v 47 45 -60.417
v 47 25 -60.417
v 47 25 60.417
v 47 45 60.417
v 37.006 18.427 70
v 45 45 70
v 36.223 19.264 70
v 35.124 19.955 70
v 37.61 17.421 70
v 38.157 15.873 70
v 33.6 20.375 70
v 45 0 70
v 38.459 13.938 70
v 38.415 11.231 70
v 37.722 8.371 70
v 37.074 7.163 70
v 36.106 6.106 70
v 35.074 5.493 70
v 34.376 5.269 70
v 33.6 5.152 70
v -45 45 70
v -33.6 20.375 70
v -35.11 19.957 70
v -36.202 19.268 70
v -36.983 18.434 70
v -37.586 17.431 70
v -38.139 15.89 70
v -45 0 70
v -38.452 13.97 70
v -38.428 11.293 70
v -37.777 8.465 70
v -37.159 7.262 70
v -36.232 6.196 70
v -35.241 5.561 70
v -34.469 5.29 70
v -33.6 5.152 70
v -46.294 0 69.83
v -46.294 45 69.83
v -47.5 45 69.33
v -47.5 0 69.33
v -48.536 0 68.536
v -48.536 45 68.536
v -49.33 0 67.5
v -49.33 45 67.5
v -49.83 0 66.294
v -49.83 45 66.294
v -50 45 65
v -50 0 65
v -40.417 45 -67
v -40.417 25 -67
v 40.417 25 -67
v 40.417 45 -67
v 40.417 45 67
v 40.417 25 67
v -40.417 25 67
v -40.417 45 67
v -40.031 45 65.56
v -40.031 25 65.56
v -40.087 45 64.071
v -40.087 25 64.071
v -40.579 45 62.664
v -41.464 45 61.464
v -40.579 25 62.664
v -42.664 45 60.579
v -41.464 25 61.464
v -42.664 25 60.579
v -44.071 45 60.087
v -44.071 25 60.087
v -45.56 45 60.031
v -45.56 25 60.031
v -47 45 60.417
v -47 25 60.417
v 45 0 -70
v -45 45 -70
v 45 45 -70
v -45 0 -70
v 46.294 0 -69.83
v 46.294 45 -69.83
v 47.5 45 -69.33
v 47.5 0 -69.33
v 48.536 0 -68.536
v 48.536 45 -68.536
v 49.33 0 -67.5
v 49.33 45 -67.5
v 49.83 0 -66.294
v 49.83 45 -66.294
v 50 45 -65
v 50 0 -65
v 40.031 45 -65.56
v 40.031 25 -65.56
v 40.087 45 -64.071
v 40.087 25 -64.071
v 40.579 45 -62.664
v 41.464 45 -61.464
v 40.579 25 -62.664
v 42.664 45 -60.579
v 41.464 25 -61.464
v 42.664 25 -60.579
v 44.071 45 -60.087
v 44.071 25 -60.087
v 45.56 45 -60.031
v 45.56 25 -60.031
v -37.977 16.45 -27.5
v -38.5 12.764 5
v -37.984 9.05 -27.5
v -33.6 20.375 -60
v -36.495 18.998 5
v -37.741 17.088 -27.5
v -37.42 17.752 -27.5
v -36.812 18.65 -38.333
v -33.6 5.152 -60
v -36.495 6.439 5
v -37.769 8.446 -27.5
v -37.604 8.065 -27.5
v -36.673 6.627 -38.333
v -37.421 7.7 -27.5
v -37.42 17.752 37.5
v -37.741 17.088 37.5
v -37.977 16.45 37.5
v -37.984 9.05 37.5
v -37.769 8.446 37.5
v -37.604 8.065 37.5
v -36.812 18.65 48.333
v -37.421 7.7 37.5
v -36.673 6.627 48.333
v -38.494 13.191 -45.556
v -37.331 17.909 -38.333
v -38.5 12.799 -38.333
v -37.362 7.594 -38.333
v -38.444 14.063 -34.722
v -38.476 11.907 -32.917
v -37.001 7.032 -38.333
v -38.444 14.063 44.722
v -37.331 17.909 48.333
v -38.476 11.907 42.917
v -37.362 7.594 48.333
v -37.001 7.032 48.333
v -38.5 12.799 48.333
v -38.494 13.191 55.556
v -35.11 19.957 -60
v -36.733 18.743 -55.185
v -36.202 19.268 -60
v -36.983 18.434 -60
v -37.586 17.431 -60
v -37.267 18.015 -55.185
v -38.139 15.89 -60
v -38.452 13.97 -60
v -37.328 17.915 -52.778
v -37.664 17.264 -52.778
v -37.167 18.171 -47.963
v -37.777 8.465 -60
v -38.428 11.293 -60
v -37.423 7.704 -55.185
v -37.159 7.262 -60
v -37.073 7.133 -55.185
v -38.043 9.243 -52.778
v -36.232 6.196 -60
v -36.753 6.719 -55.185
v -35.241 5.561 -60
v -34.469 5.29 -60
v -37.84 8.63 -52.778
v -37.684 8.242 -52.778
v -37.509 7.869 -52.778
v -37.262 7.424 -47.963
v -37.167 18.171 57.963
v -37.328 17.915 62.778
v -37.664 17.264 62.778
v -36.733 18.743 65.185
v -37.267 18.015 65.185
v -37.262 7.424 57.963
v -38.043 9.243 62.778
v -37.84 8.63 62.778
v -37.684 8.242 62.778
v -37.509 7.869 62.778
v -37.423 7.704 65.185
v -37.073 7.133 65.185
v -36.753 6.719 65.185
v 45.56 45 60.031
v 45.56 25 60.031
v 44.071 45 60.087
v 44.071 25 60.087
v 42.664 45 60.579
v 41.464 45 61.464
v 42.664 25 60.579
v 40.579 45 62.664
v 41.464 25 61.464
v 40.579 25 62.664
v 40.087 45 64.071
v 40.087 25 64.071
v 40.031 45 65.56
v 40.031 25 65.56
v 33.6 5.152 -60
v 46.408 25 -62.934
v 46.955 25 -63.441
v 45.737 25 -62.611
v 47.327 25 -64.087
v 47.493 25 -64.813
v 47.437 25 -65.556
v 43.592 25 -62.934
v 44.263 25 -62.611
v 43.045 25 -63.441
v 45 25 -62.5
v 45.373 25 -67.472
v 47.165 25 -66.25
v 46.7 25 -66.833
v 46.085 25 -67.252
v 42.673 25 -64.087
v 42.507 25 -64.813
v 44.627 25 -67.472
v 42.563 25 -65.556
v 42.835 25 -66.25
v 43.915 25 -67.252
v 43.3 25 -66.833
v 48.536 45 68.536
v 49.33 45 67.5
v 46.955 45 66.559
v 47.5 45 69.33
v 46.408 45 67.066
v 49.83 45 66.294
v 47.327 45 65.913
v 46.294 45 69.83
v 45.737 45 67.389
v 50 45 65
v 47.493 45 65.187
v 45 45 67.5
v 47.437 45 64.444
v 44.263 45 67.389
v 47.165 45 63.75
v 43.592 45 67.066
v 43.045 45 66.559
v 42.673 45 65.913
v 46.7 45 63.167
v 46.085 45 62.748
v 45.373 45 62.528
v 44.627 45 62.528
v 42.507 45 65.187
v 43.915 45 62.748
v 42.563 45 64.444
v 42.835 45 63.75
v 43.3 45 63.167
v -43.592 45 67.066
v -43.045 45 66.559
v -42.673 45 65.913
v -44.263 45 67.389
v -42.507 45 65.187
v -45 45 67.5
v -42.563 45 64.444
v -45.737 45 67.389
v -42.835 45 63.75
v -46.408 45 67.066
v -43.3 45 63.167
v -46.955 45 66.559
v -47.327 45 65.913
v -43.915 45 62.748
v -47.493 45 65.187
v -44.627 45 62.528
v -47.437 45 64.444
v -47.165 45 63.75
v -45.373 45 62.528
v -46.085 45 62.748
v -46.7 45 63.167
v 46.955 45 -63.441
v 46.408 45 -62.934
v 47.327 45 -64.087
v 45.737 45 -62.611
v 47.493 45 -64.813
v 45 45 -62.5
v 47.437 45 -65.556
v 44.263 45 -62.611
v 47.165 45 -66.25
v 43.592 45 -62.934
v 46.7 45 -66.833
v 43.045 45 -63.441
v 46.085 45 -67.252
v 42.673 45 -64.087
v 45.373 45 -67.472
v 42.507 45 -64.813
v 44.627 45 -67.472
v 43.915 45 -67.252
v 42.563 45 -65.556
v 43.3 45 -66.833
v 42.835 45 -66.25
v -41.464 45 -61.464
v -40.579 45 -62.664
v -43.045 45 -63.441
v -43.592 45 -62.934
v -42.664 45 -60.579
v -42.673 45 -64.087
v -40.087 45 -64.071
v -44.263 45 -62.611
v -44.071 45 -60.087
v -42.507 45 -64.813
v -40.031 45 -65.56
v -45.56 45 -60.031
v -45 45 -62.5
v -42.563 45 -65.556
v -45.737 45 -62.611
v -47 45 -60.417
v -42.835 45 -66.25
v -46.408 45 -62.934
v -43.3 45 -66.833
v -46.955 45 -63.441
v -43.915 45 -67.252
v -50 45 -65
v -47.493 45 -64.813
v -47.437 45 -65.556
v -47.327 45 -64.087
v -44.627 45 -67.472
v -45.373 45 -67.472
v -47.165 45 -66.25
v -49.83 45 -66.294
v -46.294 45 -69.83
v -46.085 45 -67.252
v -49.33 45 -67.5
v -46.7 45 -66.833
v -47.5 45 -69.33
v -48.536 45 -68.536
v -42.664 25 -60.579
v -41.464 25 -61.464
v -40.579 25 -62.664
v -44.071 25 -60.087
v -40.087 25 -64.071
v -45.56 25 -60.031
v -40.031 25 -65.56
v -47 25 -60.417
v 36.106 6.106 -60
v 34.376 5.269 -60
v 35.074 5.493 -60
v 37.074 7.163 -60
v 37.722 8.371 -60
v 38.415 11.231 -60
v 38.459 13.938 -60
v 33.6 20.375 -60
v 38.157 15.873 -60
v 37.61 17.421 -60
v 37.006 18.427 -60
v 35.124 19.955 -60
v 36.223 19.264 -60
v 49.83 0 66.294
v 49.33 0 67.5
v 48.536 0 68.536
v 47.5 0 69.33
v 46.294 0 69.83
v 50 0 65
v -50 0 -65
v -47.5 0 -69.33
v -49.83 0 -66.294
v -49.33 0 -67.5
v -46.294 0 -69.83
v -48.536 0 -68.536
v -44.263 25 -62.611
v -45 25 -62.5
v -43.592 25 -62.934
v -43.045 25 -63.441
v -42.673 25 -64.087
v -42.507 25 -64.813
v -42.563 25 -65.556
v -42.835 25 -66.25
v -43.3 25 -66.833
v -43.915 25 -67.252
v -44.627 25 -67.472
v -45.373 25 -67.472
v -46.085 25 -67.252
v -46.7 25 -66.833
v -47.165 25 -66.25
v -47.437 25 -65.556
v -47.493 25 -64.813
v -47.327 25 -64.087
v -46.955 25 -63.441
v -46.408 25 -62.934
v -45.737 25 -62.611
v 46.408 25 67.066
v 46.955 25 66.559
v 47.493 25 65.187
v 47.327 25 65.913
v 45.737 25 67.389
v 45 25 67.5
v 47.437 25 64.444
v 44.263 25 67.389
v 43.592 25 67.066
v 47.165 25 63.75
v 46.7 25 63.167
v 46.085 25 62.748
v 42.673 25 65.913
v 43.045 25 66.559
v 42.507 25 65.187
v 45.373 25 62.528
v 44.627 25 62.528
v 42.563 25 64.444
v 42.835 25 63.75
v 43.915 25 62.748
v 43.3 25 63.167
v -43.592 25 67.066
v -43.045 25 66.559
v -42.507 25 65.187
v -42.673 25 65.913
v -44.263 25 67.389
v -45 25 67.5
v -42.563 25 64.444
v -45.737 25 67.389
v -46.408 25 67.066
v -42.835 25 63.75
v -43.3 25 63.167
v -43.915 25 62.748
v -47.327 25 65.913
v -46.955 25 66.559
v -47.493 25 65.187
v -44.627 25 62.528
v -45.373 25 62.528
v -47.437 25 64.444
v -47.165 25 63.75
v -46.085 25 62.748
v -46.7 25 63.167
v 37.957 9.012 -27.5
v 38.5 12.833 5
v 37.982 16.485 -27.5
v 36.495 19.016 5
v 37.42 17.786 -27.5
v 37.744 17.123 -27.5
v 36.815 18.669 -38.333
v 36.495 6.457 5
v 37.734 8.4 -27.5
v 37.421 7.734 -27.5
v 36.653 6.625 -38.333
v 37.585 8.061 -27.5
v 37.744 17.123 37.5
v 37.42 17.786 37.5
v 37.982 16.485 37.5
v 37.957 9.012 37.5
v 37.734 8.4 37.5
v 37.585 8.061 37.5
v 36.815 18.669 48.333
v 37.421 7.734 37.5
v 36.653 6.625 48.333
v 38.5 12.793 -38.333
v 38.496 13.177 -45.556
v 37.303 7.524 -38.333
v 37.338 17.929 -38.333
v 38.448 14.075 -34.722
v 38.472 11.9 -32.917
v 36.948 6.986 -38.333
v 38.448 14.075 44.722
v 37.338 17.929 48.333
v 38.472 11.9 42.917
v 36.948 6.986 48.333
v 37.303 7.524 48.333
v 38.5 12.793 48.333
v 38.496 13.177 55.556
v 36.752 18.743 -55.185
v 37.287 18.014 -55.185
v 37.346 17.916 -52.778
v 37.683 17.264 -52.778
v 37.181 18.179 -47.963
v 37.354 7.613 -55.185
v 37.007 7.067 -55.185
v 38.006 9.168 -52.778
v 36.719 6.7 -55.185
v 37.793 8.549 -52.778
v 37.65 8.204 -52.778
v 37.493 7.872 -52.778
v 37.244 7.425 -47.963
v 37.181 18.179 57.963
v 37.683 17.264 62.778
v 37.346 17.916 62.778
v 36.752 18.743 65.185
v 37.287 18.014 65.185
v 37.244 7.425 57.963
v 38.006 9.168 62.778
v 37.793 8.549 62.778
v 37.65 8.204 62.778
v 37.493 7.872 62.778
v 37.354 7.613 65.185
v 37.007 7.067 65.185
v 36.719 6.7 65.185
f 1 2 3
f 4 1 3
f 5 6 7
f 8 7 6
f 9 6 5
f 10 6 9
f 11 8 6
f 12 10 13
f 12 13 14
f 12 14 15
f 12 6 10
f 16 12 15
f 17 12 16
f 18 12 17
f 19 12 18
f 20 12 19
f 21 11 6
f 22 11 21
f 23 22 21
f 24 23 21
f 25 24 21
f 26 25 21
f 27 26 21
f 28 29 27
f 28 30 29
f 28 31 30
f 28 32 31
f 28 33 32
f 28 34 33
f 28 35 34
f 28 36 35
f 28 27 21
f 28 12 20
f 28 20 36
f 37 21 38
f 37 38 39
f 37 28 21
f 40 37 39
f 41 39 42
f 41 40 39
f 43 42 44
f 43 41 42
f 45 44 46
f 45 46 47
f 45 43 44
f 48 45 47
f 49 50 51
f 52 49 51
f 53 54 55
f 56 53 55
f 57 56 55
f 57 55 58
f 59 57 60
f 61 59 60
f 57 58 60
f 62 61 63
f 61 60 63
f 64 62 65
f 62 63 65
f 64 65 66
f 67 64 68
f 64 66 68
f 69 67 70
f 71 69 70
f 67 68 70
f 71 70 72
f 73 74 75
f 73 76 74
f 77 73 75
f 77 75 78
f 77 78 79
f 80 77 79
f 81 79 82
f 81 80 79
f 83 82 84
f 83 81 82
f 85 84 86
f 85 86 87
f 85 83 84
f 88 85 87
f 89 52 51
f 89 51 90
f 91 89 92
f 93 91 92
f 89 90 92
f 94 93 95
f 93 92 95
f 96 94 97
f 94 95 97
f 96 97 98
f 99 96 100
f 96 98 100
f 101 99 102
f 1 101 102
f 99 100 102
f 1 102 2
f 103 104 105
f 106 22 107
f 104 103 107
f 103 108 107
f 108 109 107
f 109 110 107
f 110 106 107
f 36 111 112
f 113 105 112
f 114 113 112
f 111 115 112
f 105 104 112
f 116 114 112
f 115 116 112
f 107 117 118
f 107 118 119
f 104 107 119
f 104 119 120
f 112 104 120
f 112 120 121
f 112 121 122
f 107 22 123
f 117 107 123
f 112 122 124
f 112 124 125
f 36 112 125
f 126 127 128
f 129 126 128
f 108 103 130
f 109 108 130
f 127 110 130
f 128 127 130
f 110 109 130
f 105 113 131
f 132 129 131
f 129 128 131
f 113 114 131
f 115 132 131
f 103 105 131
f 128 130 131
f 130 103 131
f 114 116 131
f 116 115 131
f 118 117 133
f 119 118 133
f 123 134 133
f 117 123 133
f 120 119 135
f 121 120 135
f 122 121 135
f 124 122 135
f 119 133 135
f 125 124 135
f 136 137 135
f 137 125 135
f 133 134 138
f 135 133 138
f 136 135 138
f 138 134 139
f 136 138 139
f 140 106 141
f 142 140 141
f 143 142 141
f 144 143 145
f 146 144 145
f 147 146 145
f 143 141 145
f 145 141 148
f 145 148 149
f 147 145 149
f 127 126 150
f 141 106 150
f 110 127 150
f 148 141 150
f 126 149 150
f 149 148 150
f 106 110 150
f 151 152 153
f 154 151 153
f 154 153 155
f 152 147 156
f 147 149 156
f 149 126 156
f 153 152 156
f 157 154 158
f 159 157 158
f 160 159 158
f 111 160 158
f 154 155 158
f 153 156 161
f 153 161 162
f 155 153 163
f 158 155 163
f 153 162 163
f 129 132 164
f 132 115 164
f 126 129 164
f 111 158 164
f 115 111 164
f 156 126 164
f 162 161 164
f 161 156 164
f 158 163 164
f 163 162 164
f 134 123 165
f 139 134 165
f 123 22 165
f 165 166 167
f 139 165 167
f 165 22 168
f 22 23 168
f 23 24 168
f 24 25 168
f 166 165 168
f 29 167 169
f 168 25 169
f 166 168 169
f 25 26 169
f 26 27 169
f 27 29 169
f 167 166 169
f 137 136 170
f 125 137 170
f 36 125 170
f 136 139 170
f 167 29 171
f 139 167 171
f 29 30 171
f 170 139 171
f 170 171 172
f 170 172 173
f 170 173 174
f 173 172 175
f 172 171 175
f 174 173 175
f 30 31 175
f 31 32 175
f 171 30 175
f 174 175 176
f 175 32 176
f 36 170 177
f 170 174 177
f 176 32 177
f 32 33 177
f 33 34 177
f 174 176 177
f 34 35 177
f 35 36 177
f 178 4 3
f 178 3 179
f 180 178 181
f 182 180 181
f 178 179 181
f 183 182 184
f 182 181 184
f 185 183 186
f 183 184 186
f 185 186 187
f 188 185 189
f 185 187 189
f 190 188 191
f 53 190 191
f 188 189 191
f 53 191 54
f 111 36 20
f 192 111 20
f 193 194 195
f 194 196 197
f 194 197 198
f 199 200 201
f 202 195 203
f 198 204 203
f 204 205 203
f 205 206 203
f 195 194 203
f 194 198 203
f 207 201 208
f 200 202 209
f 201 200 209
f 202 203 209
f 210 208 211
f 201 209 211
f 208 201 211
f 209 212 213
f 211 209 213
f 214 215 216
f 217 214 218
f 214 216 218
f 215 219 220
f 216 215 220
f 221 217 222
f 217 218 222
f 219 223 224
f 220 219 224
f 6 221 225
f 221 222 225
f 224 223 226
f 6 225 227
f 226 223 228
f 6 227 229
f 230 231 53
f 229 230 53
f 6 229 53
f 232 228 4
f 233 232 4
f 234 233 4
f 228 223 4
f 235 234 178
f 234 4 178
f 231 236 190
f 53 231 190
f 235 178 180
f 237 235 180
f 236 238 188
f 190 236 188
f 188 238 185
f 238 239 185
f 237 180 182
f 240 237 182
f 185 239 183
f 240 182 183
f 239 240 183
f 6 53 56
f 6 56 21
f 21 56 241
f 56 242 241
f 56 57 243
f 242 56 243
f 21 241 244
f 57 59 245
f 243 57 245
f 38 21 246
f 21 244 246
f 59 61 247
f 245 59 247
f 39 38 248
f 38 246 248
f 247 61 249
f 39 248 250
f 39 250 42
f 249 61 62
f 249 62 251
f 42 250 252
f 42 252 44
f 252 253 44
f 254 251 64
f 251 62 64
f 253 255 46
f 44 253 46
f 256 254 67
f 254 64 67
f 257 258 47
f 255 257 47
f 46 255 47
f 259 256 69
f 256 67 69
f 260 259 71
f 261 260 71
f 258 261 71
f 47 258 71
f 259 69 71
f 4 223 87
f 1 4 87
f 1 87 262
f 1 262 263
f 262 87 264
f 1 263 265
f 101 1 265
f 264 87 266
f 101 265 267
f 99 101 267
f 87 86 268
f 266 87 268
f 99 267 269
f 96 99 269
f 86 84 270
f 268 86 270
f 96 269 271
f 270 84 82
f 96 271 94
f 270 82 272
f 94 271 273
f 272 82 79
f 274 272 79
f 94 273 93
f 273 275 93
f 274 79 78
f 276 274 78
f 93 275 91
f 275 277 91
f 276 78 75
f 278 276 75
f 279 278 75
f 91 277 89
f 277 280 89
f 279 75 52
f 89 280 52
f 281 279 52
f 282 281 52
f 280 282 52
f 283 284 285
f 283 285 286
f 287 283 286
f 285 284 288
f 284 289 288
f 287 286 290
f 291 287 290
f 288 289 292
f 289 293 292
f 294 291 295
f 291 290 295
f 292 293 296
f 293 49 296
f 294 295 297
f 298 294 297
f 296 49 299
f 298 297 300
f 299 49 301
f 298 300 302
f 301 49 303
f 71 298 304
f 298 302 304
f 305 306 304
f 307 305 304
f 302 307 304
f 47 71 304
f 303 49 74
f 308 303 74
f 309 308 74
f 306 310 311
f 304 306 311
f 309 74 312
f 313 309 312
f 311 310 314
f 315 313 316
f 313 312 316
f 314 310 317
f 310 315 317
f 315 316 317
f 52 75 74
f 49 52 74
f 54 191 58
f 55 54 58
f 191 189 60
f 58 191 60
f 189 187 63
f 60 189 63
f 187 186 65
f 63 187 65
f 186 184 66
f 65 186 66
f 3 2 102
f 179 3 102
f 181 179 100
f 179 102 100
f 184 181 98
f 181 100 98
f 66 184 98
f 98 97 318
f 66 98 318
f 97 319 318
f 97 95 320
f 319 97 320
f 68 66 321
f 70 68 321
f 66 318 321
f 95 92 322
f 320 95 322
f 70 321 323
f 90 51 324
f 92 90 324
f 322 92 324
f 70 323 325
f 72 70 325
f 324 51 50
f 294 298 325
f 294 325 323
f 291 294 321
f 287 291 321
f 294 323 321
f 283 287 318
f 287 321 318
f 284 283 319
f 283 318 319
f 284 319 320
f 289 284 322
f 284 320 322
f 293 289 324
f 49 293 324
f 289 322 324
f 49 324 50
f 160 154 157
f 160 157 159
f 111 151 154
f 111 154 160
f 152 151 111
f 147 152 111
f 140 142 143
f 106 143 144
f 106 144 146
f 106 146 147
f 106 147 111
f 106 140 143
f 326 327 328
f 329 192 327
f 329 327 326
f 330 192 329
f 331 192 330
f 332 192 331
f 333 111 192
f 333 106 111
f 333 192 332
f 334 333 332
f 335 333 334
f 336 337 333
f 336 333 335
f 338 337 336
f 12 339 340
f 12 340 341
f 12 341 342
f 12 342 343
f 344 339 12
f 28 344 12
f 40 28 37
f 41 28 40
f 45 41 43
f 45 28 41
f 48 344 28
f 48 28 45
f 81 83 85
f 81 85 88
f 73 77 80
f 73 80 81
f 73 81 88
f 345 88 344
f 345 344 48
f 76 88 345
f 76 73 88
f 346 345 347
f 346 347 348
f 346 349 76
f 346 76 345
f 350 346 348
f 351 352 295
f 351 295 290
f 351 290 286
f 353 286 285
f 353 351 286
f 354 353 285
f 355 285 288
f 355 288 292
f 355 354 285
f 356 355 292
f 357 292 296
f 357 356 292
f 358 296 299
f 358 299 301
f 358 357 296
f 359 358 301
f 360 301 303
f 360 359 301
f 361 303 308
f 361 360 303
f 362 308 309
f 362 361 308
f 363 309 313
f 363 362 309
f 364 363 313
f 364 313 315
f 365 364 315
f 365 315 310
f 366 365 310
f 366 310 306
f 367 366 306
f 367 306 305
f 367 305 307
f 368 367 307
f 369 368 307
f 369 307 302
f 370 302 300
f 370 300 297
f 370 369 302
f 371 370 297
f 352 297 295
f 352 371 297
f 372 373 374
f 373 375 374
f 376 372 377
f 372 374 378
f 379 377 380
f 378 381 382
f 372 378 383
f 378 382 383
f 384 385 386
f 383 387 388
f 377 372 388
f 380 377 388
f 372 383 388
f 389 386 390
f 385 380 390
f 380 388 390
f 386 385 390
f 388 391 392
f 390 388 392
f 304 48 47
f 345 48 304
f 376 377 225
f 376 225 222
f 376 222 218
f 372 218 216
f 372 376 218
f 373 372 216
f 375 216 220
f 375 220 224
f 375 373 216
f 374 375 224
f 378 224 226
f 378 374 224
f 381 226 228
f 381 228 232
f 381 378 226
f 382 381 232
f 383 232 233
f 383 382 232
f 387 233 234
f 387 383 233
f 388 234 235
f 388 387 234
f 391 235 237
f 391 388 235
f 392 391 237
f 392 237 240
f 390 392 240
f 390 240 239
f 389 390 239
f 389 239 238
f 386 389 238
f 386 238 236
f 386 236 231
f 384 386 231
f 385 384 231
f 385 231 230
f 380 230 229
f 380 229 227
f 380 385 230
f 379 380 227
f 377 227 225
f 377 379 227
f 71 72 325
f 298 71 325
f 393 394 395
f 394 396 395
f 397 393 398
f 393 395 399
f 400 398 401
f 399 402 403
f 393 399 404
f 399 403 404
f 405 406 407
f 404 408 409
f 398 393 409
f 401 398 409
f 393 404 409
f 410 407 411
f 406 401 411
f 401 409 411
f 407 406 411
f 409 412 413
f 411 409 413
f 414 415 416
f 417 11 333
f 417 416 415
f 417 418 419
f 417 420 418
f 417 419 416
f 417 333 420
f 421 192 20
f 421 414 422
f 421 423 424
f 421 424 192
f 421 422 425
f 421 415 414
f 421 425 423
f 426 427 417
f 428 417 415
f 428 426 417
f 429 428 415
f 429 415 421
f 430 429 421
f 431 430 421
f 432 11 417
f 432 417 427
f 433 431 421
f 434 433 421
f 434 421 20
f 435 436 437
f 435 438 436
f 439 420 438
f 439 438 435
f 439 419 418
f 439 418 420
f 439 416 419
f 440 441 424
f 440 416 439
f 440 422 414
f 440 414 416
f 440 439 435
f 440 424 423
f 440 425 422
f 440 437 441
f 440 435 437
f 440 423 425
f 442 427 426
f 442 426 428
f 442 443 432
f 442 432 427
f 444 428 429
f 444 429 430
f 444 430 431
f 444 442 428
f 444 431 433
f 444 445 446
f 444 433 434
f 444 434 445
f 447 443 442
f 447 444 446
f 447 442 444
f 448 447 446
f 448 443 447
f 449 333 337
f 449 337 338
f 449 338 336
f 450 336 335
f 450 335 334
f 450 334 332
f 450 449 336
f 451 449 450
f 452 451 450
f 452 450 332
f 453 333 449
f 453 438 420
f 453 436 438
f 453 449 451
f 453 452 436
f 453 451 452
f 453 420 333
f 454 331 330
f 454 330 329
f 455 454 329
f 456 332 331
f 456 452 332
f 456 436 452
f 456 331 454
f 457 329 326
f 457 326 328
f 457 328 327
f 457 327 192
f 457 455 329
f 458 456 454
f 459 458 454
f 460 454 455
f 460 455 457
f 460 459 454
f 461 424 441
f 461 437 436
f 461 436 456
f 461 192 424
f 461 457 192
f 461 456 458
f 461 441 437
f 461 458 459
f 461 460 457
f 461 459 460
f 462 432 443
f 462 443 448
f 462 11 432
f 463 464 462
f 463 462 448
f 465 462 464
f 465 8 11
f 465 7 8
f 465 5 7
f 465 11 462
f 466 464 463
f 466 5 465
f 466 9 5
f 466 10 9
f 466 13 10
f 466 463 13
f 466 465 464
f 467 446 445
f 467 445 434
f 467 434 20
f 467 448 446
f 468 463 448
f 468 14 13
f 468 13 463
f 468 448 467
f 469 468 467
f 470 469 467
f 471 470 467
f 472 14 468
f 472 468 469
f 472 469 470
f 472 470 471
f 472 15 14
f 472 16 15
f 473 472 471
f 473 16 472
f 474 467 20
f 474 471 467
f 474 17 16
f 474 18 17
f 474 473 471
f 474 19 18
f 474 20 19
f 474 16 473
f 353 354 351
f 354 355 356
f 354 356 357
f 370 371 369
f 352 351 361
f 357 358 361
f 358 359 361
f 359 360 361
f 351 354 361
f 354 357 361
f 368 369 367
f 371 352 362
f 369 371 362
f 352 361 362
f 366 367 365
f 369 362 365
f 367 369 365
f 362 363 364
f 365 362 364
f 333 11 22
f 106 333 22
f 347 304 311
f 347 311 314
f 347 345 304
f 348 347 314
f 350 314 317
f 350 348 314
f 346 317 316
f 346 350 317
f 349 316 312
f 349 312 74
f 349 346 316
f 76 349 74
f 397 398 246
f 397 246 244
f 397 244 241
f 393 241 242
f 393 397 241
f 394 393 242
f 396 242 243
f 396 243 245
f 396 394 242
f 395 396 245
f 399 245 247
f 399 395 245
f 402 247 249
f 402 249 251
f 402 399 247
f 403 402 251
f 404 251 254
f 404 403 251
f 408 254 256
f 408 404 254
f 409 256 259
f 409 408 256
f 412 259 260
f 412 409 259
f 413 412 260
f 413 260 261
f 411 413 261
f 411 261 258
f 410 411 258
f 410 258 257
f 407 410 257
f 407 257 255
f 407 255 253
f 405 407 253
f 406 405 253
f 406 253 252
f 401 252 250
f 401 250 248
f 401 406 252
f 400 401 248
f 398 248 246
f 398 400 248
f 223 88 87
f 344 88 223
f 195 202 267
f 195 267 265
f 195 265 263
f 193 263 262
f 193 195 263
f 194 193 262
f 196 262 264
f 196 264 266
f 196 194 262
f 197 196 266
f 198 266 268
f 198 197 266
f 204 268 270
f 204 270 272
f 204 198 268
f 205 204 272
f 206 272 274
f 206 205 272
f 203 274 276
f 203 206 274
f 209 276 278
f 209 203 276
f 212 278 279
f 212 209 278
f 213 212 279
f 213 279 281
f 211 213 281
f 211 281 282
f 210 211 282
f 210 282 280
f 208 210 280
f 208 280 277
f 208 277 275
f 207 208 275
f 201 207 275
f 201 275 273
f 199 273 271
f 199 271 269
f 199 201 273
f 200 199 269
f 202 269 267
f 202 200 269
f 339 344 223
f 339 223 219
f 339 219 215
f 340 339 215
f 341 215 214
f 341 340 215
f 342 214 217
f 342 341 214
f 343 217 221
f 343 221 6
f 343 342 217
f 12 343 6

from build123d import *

# Parameters (mm, degrees)
BOSS_EXTRUDE2_DEPTH = 25
BOSS_EXTRUDE3_START = 25
SKETCH1_3_R         = 2.5
BOSS_EXTRUDE3_DEPTH = 20
CUT_EXTRUDE1_DEPTH  = 130


with BuildPart() as part:
    # Sketch1 → Boss-Extrude2 (new body)
    with BuildSketch(Plane(origin=(0, 0, 0), x_dir=(1, 0, 0), z_dir=(0, 1, 0))):
        with BuildLine():
            Line((-45, 70), (45, 70))
            ThreePointArc((45, 70), (48.535533906, 68.535533906), (50, 65))
            Line((50, 65), (50, -65))
            ThreePointArc((50, -65), (48.535533906, -68.535533906), (45, -70))
            Line((45, -70), (-45, -70))
            ThreePointArc((-45, -70), (-48.535533906, -68.535533906), (-50, -65))
            Line((-50, -65), (-50, 65))
            ThreePointArc((-50, 65), (-48.535533906, 68.535533906), (-45, 70))
        make_face()
    extrude(amount=BOSS_EXTRUDE2_DEPTH)

    # Sketch1<3> → Boss-Extrude3 (add)
    with BuildSketch(Plane(origin=(0, 0, 0), x_dir=(1, 0, 0), z_dir=(0, 1, 0)).offset(BOSS_EXTRUDE3_START)):
        with BuildLine():
            Line((-45, 70), (45, 70))
            ThreePointArc((45, 70), (48.535533906, 68.535533906), (50, 65))
            Line((50, 65), (50, -65))
            ThreePointArc((50, -65), (48.535533906, -68.535533906), (45, -70))
            Line((45, -70), (-45, -70))
            ThreePointArc((-45, -70), (-48.535533906, -68.535533906), (-50, -65))
            Line((-50, -65), (-50, 65))
            ThreePointArc((-50, 65), (-48.535533906, 68.535533906), (-45, 70))
        make_face()
        with Locations(Location((-45, 65, 0), (0, 0, 270))):
            Circle(SKETCH1_3_R, mode=Mode.SUBTRACT)
        with Locations(Location((45, 65, 0), (0, 0, 270))):
            Circle(SKETCH1_3_R, mode=Mode.SUBTRACT)
        with Locations(Location((45, -65, 0), (0, 0, 270))):
            Circle(SKETCH1_3_R, mode=Mode.SUBTRACT)
        with Locations(Location((-45, -65, 0), (0, 0, 270))):
            Circle(SKETCH1_3_R, mode=Mode.SUBTRACT)
        with BuildLine():
            Line((-40.417424305, 67), (40.417424305, 67))
            ThreePointArc((40.417424305, 67), (41.464466094, 61.464466094), (47, 60.417424305))
            Line((47, 60.417424305), (47, -60.417424305))
            ThreePointArc((47, -60.417424305), (41.464466094, -61.464466094), (40.417424305, -67))
            Line((40.417424305, -67), (-40.417424305, -67))
            ThreePointArc((-40.417424305, -67), (-41.464466094, -61.464466094), (-47, -60.417424305))
            Line((-47, -60.417424305), (-47, 60.417424305))
            ThreePointArc((-47, 60.417424305), (-41.464466094, 61.464466094), (-40.417424305, 67))
        make_face(mode=Mode.SUBTRACT)
    extrude(amount=BOSS_EXTRUDE3_DEPTH)

    # Sketch2 → Cut-Extrude1 (cut)
    with BuildSketch(Plane.XY.offset(70)):
        with BuildLine():
            Line((-33.600286554, 5.152304199), (33.600286554, 5.152304199))
            add(Edge.make_bspline(
                [(33.600286554, 20.375134216), (37.254581283, 19.906525536), (39.744987875, 13.002442779), (37.255381919, 5.419067927), (33.600286554, 5.152304199)],
                knots=[0, 0, 0, 0, 0.5, 1, 1, 1, 1], degree=3))
            Line((33.600286554, 20.375134216), (-33.600286554, 20.375134216))
            add(Edge.make_bspline(
                [(-33.600286554, 20.375134216), (-37.254581283, 19.906525536), (-39.744987875, 12.865320549), (-37.255381919, 5.419067927), (-33.600286554, 5.152304199)],
                knots=[0, 0, 0, 0, 0.5, 1, 1, 1, 1], degree=3))
        make_face()
    extrude(amount=-CUT_EXTRUDE1_DEPTH, mode=Mode.SUBTRACT)


solid = part.part
